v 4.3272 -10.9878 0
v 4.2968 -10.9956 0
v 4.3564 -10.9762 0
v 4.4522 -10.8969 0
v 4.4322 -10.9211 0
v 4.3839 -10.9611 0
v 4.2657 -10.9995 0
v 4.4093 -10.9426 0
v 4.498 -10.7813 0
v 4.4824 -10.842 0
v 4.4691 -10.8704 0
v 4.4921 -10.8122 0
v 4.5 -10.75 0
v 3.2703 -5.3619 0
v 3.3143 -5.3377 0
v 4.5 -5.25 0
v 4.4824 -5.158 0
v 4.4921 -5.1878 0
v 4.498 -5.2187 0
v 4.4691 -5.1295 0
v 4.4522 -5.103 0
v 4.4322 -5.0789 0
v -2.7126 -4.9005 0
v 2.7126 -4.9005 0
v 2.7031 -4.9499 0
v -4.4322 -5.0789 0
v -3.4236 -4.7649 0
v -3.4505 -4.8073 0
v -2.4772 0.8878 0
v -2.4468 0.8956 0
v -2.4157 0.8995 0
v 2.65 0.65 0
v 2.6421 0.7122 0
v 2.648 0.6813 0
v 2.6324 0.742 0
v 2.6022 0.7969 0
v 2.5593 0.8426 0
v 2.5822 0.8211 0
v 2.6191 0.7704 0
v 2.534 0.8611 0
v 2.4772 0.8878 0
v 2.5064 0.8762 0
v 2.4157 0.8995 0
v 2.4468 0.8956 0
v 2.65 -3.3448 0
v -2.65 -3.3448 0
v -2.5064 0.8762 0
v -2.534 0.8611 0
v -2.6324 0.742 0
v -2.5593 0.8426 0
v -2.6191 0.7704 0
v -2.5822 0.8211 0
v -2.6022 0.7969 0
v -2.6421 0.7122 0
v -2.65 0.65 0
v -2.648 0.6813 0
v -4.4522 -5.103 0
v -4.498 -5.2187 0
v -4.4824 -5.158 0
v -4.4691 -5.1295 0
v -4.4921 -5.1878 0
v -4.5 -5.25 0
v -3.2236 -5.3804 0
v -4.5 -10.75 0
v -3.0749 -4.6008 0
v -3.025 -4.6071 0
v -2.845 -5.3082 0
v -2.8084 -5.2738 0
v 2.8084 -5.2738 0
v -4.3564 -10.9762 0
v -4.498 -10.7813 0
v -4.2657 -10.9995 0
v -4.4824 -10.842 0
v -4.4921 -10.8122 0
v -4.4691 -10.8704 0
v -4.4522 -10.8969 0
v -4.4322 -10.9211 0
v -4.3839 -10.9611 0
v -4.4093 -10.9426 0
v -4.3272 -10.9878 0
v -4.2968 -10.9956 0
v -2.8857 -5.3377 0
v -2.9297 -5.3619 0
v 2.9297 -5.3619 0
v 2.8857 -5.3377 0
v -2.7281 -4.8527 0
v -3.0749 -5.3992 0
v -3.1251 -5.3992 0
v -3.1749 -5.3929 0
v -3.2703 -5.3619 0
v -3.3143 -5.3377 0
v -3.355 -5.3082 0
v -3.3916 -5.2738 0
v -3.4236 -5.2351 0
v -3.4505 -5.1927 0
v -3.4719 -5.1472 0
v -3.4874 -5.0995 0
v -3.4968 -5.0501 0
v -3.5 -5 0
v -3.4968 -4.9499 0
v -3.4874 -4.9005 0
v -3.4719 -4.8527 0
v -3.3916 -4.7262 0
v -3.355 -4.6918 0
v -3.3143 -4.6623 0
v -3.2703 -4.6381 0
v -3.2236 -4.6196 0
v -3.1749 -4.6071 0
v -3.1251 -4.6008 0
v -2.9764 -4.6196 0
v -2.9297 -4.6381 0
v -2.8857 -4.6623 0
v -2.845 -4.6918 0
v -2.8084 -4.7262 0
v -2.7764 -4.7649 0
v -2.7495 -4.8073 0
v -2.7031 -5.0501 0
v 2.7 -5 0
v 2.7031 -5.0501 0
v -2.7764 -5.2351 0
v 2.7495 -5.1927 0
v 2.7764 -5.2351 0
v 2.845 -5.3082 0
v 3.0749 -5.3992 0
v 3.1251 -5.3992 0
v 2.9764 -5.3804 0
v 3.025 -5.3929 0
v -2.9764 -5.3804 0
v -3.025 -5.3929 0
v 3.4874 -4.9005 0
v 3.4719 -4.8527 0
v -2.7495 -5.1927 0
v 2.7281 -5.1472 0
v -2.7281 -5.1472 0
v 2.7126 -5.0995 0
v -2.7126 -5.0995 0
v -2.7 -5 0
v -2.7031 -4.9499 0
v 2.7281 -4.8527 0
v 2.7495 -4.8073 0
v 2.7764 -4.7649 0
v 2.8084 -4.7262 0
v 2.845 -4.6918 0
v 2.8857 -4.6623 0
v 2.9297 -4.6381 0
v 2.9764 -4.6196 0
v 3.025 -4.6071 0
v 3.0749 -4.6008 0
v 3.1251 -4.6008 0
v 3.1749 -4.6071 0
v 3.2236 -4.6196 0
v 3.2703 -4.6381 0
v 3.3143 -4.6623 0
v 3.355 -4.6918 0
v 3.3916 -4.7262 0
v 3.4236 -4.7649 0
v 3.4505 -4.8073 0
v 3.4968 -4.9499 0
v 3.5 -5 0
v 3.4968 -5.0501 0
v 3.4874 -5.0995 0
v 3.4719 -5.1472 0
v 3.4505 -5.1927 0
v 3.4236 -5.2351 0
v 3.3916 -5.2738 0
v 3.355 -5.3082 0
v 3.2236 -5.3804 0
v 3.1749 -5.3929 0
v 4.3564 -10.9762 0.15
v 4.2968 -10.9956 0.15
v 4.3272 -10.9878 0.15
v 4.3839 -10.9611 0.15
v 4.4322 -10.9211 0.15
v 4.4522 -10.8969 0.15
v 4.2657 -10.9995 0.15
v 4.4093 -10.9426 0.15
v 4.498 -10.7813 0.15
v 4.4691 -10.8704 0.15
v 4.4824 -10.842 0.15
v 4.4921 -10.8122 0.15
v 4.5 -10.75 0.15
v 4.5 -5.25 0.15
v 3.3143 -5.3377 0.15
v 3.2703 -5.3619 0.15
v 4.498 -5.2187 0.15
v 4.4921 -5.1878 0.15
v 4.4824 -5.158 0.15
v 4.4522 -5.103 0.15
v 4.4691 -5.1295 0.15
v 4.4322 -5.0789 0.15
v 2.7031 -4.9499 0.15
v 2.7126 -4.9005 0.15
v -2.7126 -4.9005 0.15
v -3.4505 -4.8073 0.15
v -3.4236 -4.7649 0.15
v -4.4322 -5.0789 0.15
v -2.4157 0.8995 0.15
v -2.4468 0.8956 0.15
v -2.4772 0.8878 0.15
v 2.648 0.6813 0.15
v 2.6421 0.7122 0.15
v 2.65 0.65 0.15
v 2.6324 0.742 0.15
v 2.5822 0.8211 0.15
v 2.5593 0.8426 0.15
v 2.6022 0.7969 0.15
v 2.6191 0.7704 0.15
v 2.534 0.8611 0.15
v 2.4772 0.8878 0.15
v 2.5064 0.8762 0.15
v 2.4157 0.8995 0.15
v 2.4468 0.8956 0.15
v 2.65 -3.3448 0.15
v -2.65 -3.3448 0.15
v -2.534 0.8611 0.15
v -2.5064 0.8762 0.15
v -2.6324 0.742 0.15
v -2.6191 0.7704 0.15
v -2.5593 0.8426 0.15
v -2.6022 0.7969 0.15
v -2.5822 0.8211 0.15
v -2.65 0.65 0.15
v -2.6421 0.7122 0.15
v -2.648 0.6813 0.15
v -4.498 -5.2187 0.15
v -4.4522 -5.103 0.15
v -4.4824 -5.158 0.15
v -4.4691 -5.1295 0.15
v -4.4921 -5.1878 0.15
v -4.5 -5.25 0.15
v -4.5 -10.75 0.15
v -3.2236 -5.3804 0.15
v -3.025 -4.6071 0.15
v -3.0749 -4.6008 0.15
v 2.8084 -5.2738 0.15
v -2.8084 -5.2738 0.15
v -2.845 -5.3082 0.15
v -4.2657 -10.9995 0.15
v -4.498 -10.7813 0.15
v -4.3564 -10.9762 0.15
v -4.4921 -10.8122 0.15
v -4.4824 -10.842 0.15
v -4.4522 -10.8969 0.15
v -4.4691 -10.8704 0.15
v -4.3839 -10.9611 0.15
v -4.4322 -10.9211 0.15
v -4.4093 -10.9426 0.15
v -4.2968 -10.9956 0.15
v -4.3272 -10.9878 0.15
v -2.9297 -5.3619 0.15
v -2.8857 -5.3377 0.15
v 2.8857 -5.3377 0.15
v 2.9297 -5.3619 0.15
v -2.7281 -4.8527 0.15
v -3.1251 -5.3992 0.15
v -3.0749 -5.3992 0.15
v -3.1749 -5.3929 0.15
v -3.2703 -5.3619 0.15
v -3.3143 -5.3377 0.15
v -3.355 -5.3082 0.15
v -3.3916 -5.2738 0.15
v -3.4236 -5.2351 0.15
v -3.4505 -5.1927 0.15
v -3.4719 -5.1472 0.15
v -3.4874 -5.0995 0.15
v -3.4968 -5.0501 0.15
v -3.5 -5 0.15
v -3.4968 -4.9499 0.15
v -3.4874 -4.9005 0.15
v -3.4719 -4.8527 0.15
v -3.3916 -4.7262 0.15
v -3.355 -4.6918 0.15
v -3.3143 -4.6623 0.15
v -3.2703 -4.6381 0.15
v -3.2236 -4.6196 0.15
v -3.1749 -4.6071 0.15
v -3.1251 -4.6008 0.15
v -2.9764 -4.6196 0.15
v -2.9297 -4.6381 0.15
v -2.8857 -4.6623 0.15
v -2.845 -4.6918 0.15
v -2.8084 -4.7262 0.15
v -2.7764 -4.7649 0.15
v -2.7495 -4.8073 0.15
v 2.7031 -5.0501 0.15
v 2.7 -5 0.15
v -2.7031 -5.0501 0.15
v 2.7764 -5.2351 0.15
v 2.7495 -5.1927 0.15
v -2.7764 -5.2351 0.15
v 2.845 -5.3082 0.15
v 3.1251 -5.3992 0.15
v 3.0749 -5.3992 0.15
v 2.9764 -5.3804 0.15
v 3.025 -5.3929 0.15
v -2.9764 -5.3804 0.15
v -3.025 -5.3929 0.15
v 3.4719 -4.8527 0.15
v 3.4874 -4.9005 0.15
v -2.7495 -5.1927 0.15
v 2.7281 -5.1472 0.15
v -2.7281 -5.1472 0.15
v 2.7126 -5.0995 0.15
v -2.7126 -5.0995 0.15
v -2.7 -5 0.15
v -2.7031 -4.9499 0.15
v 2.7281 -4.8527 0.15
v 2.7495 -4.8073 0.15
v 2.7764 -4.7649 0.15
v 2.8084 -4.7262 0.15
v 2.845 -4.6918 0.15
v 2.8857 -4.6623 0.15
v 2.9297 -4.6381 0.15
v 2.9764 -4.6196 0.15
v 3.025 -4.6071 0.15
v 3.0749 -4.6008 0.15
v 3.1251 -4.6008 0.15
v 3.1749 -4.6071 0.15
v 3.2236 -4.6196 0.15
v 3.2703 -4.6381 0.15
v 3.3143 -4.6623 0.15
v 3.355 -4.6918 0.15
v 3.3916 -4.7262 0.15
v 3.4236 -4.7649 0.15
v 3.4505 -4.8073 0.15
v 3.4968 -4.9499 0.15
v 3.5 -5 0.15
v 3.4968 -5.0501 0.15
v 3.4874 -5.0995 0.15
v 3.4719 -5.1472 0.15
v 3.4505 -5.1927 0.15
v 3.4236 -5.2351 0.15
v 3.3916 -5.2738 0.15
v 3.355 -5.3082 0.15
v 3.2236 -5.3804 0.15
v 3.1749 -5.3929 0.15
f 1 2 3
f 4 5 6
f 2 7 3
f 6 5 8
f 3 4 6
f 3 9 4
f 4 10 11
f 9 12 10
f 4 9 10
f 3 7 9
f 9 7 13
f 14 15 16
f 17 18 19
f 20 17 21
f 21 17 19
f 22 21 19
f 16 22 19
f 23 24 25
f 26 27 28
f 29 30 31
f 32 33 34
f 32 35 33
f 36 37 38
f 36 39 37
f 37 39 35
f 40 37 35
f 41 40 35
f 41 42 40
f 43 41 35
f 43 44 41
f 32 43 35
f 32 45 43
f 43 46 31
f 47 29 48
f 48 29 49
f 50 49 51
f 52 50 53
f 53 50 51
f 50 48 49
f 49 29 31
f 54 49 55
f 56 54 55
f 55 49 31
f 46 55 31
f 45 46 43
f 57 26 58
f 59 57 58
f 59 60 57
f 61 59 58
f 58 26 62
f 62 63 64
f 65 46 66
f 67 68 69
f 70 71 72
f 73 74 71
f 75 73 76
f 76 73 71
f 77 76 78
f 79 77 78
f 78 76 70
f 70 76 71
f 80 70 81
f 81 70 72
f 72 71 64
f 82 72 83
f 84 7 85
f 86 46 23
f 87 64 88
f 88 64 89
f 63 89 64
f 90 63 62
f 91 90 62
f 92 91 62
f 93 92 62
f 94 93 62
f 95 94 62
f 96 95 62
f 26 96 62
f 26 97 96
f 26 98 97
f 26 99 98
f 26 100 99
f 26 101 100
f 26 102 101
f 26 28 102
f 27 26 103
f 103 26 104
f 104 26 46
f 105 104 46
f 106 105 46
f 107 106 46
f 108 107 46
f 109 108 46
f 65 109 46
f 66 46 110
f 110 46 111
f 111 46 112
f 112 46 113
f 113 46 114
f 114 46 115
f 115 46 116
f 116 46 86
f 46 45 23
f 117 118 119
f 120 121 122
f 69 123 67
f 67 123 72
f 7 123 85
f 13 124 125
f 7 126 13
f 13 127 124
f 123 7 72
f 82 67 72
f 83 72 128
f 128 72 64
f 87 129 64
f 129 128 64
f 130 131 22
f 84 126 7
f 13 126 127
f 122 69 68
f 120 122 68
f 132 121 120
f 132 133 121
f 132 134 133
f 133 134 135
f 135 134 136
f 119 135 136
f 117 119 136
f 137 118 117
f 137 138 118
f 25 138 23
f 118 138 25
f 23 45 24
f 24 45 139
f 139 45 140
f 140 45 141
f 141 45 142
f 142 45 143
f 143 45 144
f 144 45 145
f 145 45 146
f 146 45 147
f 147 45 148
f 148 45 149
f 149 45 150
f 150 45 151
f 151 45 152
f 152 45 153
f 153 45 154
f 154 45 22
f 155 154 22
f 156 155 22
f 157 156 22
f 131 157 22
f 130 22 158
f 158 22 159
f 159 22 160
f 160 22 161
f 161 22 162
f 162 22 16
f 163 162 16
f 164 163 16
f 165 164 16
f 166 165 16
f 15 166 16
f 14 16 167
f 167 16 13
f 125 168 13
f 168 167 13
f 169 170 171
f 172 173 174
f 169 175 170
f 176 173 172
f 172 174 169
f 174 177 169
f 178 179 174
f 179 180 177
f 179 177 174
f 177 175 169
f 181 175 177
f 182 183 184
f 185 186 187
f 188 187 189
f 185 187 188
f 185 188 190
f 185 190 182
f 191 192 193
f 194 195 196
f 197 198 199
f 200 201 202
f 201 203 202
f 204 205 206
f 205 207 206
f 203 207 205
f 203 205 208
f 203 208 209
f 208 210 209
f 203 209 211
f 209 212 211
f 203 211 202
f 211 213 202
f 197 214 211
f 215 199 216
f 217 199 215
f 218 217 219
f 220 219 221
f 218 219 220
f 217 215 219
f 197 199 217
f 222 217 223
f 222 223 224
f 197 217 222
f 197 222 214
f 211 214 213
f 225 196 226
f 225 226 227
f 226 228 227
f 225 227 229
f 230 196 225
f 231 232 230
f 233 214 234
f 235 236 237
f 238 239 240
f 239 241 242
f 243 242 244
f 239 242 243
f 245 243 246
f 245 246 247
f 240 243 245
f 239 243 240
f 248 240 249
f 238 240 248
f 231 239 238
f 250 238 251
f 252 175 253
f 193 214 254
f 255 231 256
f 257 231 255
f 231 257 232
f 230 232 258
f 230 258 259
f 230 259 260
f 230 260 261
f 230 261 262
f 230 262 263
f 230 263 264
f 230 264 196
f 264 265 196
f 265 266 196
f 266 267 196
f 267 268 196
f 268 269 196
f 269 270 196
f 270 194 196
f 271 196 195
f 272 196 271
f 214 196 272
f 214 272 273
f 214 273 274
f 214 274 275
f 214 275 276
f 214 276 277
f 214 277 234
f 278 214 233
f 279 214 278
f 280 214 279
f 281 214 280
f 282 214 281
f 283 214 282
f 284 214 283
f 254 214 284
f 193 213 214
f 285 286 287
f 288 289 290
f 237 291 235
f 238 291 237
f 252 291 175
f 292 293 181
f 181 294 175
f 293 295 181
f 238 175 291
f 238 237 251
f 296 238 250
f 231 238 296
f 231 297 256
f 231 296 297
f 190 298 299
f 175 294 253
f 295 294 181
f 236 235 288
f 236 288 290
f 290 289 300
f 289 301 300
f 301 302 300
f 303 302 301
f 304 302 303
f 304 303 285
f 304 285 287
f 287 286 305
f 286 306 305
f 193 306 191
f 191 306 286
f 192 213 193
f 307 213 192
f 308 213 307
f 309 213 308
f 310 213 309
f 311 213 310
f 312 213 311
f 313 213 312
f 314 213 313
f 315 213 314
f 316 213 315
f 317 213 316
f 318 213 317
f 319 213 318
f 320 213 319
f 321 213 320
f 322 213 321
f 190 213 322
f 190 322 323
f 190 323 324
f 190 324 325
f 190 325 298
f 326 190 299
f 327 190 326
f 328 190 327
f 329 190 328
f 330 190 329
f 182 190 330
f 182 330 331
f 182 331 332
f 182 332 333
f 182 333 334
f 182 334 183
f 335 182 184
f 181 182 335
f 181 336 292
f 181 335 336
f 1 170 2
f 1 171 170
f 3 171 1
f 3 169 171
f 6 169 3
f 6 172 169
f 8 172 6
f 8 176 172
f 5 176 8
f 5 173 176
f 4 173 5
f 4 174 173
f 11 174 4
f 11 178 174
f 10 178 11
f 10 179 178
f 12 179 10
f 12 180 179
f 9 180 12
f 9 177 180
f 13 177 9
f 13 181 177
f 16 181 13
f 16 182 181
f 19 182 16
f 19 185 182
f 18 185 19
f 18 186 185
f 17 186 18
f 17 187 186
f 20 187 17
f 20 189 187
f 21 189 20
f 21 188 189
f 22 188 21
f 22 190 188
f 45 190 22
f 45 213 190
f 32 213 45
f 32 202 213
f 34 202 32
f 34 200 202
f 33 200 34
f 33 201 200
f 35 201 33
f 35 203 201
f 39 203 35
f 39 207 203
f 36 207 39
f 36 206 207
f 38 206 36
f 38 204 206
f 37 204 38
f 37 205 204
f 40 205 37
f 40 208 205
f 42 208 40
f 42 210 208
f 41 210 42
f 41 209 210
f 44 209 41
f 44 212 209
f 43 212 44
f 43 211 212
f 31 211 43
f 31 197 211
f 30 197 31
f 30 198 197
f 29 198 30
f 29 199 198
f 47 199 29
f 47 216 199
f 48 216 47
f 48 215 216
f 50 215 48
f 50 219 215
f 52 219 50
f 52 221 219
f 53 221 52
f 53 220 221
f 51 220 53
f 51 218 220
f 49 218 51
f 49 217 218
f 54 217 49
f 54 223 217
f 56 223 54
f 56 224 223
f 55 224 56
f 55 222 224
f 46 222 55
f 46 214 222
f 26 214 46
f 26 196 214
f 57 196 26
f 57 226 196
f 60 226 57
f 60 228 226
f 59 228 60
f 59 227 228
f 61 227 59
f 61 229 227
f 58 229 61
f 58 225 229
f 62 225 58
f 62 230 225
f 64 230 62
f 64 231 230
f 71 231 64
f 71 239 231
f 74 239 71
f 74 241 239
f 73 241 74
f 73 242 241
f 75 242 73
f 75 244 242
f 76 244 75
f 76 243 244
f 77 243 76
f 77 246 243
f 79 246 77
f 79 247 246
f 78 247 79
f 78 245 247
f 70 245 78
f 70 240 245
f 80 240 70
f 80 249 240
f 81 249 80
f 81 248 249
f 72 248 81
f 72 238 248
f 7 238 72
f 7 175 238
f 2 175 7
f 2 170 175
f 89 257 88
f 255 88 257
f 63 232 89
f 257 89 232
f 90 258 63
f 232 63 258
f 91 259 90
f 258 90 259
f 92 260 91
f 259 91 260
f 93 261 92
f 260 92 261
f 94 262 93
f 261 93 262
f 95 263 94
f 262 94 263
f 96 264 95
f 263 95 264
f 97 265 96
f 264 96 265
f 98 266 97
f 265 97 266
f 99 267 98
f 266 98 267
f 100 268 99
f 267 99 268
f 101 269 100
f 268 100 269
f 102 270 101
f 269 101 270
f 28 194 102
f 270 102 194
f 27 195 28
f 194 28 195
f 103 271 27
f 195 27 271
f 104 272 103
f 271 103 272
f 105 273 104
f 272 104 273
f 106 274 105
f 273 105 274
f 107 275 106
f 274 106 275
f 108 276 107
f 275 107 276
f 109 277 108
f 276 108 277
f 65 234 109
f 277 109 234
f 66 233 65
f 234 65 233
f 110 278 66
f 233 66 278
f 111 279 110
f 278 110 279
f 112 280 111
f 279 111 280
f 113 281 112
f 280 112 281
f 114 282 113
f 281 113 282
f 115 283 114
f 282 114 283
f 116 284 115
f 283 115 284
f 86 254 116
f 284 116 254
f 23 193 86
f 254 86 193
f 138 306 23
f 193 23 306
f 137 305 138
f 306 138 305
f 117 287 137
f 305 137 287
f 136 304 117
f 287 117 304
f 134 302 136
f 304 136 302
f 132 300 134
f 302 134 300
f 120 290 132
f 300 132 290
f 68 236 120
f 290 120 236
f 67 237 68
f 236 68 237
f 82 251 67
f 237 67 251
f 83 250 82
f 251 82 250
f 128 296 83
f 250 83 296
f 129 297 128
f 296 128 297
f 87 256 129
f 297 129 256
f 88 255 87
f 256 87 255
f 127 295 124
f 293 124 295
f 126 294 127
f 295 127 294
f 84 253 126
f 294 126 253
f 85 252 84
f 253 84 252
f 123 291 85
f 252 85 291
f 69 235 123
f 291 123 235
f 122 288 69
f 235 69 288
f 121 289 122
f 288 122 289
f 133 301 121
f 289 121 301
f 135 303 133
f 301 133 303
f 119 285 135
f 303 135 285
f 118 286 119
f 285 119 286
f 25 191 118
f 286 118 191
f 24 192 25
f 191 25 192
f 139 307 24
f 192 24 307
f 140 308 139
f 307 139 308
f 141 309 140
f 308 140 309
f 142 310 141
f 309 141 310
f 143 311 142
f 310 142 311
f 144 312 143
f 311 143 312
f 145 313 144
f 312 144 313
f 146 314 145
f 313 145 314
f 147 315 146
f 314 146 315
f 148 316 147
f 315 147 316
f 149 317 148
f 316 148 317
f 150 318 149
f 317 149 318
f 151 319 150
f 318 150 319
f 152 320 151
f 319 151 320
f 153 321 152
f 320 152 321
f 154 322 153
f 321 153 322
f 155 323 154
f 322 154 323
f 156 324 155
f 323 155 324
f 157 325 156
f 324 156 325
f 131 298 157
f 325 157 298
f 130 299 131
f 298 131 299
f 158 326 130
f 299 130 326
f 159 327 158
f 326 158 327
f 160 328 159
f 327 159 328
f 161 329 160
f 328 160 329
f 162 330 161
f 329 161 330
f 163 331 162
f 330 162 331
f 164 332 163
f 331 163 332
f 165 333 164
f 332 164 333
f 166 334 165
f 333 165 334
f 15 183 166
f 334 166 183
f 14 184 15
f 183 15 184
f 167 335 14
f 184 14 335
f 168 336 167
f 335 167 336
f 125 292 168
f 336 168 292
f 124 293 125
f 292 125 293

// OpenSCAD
$fn=50;
flxRad=0.25; //edge rad of Flex
flxPnlDims=[5.3,0.9]; //Dimensions of Flex on Panel
flxTapDims=[9,6];
flxThck=0.15;
//Length of Flex from panel to tap
flxLen=11;
//holes in the flex
flxHoleDist=6.2;
flxHoleDia=0.8;
//offset from bottom
flxHoleBtmOffset=6;

linear_extrude(flxThck)
 difference(){
    flexContour(); 
    for (ix=[-1,1])
      translate([ix*flxHoleDist/2,flxHoleBtmOffset-flxLen]) circle(d=flxHoleDia);
  }
  
module flexContour(){
     //tap
      hull(){
        for (ix=[-1,1],iy=[-1,1])
          translate([ix*(flxTapDims.x/2-flxRad),iy*(flxTapDims.y/2-flxRad)-flxLen+flxTapDims.y/2]) circle(flxRad);
      }
      //main
      hull(){
        for (ix=[-1,1],iy=[-1,1])
          translate([ix*(flxPnlDims.x/2-flxRad),iy*((flxLen+flxPnlDims.y)/2-flxRad)-(flxLen-flxPnlDims.y)/2]) 
            circle(flxRad);
      }
      //45° transistion between tap an main flex
      hull(){
       for (ix=[-1,1])
          translate([ix*(flxPnlDims.x/2-flxRad),((flxLen+flxPnlDims.y)/2-flxRad)-flxLen+(flxTapDims.x-flxPnlDims.x)/2]) 
            circle(flxRad);
        for (ix=[-1,1])
          translate([ix*(flxTapDims.x/2-flxRad),(flxTapDims.y/2-flxRad)-flxLen+flxTapDims.y/2]) circle(flxRad);
        }
}
